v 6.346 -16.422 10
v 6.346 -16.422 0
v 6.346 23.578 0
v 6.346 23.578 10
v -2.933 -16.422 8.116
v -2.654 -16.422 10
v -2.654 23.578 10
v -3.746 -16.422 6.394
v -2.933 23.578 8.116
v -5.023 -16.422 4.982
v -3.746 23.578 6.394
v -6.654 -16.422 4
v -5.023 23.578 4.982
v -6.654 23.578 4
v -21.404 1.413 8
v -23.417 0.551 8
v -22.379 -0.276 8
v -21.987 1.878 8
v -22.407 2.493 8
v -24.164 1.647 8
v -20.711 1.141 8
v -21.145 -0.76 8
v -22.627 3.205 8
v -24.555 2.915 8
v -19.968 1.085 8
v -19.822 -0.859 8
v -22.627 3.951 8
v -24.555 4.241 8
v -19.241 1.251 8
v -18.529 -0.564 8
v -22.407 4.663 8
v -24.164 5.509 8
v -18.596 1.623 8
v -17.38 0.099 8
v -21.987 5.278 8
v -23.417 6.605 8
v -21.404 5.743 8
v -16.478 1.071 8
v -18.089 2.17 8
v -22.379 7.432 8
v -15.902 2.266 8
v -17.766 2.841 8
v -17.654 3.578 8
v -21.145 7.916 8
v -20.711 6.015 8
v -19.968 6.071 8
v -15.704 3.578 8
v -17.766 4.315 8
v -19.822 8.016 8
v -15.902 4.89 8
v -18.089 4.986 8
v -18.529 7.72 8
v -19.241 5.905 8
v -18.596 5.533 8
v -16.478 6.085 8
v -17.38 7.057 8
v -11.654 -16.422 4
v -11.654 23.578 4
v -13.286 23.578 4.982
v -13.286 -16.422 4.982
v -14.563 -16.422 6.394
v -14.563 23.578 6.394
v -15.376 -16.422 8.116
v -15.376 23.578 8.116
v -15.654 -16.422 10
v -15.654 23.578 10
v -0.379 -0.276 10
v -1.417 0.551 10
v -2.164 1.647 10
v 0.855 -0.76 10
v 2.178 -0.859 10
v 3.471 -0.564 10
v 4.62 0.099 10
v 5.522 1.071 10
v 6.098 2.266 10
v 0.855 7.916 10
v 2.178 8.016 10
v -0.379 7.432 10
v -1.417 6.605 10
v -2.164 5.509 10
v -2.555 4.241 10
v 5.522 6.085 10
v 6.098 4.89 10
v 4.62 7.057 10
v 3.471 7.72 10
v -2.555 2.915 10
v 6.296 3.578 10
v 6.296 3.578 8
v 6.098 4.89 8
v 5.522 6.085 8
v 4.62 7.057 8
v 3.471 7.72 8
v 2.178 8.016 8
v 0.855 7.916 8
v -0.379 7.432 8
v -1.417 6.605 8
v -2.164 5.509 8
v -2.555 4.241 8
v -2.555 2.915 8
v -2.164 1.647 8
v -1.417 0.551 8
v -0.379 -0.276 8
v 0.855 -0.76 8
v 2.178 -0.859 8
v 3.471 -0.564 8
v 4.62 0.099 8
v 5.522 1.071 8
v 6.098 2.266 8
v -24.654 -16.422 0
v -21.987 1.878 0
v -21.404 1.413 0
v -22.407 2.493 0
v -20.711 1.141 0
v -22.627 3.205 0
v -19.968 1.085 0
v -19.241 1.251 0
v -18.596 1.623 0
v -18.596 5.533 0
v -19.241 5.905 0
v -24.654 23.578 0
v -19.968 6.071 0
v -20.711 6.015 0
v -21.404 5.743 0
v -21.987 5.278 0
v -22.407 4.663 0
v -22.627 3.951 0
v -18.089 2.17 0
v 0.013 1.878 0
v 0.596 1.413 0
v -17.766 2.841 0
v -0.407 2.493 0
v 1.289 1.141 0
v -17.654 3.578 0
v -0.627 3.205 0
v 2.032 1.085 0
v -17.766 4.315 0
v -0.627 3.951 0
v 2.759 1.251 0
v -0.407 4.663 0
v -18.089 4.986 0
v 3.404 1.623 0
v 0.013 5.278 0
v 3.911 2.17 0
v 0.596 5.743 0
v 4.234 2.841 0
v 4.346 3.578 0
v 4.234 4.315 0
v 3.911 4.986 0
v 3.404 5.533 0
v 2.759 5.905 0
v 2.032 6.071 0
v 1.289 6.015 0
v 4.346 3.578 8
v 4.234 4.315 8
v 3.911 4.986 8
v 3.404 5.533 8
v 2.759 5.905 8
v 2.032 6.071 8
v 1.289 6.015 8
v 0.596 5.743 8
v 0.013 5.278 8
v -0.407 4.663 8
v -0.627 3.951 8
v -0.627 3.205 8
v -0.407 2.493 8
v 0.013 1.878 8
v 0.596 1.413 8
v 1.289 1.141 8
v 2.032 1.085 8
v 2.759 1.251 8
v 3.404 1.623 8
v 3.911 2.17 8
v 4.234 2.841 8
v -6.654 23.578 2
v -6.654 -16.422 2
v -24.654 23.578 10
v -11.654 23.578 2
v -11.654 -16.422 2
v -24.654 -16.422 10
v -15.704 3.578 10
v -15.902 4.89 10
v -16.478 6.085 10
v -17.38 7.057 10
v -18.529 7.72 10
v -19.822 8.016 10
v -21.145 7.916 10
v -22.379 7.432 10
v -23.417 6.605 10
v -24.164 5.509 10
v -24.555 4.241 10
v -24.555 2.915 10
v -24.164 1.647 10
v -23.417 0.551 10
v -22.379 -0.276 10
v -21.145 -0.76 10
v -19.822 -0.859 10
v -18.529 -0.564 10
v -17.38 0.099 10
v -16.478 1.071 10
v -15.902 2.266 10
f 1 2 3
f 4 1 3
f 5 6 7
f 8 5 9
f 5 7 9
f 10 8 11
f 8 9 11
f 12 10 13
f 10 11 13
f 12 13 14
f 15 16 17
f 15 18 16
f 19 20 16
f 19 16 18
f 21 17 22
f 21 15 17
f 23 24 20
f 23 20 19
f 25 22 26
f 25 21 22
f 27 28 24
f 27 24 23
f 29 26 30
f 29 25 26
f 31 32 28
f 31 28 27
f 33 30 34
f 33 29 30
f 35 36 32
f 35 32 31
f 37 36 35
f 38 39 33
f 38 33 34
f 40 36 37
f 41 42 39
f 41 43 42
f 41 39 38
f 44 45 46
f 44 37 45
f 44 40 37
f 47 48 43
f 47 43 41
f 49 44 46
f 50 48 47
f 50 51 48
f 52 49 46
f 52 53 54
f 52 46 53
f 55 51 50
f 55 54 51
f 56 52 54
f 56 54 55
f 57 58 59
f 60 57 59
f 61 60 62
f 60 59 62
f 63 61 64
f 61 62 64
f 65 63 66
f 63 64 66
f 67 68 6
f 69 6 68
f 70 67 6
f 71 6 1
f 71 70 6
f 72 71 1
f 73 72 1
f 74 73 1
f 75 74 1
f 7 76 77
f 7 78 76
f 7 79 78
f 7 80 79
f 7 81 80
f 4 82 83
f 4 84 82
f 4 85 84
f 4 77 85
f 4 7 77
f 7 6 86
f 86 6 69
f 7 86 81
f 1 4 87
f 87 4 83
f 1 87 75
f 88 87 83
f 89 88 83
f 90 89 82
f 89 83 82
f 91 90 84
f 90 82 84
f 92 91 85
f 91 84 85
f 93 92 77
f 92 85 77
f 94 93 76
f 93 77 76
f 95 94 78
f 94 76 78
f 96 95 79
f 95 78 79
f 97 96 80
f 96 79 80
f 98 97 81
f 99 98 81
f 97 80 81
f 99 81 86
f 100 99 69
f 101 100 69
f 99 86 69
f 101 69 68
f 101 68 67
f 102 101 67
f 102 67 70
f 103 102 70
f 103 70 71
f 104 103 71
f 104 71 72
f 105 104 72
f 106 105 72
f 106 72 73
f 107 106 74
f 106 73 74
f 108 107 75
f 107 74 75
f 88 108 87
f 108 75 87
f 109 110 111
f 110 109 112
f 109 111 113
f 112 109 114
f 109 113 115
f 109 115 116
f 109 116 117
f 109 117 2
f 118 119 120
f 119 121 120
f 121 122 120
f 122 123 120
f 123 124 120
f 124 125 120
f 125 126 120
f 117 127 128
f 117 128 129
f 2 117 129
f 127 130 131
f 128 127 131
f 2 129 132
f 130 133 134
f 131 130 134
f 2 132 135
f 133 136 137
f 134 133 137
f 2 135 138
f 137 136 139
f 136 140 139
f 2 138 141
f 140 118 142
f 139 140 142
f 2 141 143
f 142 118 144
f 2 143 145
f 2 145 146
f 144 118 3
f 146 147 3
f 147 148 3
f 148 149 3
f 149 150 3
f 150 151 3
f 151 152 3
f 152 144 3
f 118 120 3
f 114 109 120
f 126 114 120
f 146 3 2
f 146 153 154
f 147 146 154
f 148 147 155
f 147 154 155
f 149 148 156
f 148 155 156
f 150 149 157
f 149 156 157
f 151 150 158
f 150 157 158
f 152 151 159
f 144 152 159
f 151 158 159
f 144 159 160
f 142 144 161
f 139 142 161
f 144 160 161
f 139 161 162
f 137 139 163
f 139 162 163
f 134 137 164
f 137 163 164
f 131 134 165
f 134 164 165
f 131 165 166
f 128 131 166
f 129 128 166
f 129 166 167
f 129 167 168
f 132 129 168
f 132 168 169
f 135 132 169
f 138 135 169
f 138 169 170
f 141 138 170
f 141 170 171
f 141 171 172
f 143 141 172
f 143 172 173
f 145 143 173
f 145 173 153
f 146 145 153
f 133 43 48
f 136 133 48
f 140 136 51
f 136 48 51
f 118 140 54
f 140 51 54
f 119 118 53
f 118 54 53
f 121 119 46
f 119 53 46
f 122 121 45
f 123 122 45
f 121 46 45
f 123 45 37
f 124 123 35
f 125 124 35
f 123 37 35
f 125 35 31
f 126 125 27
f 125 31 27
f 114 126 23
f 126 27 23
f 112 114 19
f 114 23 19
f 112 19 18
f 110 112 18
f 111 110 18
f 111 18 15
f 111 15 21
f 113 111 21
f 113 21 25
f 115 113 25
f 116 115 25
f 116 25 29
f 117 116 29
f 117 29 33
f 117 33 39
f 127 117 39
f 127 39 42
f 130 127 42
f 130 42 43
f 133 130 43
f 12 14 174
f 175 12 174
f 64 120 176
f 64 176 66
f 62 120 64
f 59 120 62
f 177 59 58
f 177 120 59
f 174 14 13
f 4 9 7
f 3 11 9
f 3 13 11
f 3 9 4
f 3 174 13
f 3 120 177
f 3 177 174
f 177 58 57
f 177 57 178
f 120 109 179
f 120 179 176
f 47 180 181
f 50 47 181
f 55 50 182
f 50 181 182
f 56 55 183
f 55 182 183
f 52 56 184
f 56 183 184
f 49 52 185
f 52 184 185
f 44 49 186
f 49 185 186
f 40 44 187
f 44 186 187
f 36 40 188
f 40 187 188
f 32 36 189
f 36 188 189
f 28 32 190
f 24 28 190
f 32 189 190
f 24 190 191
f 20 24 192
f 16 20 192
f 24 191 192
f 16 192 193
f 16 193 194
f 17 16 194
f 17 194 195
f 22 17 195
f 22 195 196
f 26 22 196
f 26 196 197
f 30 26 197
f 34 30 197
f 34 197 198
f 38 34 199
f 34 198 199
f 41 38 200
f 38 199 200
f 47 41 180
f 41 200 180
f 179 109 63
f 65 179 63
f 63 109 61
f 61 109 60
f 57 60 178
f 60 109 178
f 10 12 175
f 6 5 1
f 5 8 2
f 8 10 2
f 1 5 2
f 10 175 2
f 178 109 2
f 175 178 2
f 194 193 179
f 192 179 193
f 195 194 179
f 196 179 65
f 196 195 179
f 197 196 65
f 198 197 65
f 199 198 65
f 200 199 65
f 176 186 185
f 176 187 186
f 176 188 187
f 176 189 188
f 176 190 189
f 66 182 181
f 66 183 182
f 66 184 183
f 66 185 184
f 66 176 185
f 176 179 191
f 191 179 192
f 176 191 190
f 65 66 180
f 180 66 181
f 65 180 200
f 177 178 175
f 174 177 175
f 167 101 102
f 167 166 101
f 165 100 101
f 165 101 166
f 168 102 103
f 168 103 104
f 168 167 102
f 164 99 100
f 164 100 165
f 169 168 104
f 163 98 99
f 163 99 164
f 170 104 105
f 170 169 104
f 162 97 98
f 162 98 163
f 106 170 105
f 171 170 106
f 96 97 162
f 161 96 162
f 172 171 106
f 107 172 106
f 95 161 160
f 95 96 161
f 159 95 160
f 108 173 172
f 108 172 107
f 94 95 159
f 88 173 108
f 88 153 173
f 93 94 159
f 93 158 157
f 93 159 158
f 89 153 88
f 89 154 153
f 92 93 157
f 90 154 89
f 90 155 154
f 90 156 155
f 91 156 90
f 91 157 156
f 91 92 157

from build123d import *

# Parameters (mm, degrees)
SKETCH1_W           = 31
SKETCH1_H           = 40
BOSS_EXTRUDE1_DEPTH = 10
SKETCH2_R           = 6.5
CUT_EXTRUDE1_DEPTH  = 49.040022953
SKETCH3_R           = 2.5
CUT_EXTRUDE2_DEPTH  = 36.549524257
SKETCH3_4_R         = 4.45
SKETCH3_4_R_2       = 2.5
CUT_EXTRUDE5_DEPTH  = 2
SKETCH4_W           = 5
SKETCH4_H           = 3
CUT_EXTRUDE6_DEPTH  = 49.040022953


with BuildPart() as part:
    # Sketch1 → Boss-Extrude1 (new body)
    with BuildSketch(Plane.XY):
        with Locations((-9.154488543, 3.578059072)):
            Rectangle(SKETCH1_W, SKETCH1_H)
    extrude(amount=BOSS_EXTRUDE1_DEPTH)

    # Sketch2 → Cut-Extrude1 (cut, through all)
    with BuildSketch(Plane(origin=(0, 23.578059072, 0), x_dir=(1, 0, 0), z_dir=(0, 1, 0))):
        with Locations((-9.154488543, -10)):
            Circle(SKETCH2_R)
    extrude(amount=-CUT_EXTRUDE1_DEPTH, mode=Mode.SUBTRACT)

    # Sketch3 → Cut-Extrude2 (cut, through all)
    with BuildSketch(Plane.XY.offset(10)):
        with Locations((-20.154488543, 3.578059072)):
            Circle(SKETCH3_R)
        with Locations((1.845511457, 3.578059072)):
            Circle(SKETCH3_R)
    extrude(amount=-CUT_EXTRUDE2_DEPTH, mode=Mode.SUBTRACT)

    # Sketch3<4> → Cut-Extrude5 (cut)
    # profile 1 of 2: a face of its own
    with BuildSketch(Plane.XY.offset(10)):
        with Locations((-20.154488543, 3.578059072)):
            Circle(SKETCH3_4_R)
        with Locations((-20.154488543, 3.578059072)):
            Circle(SKETCH3_4_R_2, mode=Mode.SUBTRACT)
    # profile 2 of 2: a face of its own
    with BuildSketch(Plane.XY.offset(10)):
        with Locations((1.845511457, 3.578059072)):
            Circle(SKETCH3_4_R)
        with Locations((1.845511457, 3.578059072)):
            Circle(SKETCH3_4_R_2, mode=Mode.SUBTRACT)
    extrude(amount=-CUT_EXTRUDE5_DEPTH, mode=Mode.SUBTRACT)

    # Sketch4 → Cut-Extrude6 (cut, through all)
    with BuildSketch(Plane(origin=(0, 23.578059072, 0), x_dir=(1, 0, 0), z_dir=(0, 1, 0))):
        with Locations((-9.154488543, -3.5)):
            Rectangle(SKETCH4_W, SKETCH4_H)
    extrude(amount=-CUT_EXTRUDE6_DEPTH, mode=Mode.SUBTRACT)


solid = part.part
